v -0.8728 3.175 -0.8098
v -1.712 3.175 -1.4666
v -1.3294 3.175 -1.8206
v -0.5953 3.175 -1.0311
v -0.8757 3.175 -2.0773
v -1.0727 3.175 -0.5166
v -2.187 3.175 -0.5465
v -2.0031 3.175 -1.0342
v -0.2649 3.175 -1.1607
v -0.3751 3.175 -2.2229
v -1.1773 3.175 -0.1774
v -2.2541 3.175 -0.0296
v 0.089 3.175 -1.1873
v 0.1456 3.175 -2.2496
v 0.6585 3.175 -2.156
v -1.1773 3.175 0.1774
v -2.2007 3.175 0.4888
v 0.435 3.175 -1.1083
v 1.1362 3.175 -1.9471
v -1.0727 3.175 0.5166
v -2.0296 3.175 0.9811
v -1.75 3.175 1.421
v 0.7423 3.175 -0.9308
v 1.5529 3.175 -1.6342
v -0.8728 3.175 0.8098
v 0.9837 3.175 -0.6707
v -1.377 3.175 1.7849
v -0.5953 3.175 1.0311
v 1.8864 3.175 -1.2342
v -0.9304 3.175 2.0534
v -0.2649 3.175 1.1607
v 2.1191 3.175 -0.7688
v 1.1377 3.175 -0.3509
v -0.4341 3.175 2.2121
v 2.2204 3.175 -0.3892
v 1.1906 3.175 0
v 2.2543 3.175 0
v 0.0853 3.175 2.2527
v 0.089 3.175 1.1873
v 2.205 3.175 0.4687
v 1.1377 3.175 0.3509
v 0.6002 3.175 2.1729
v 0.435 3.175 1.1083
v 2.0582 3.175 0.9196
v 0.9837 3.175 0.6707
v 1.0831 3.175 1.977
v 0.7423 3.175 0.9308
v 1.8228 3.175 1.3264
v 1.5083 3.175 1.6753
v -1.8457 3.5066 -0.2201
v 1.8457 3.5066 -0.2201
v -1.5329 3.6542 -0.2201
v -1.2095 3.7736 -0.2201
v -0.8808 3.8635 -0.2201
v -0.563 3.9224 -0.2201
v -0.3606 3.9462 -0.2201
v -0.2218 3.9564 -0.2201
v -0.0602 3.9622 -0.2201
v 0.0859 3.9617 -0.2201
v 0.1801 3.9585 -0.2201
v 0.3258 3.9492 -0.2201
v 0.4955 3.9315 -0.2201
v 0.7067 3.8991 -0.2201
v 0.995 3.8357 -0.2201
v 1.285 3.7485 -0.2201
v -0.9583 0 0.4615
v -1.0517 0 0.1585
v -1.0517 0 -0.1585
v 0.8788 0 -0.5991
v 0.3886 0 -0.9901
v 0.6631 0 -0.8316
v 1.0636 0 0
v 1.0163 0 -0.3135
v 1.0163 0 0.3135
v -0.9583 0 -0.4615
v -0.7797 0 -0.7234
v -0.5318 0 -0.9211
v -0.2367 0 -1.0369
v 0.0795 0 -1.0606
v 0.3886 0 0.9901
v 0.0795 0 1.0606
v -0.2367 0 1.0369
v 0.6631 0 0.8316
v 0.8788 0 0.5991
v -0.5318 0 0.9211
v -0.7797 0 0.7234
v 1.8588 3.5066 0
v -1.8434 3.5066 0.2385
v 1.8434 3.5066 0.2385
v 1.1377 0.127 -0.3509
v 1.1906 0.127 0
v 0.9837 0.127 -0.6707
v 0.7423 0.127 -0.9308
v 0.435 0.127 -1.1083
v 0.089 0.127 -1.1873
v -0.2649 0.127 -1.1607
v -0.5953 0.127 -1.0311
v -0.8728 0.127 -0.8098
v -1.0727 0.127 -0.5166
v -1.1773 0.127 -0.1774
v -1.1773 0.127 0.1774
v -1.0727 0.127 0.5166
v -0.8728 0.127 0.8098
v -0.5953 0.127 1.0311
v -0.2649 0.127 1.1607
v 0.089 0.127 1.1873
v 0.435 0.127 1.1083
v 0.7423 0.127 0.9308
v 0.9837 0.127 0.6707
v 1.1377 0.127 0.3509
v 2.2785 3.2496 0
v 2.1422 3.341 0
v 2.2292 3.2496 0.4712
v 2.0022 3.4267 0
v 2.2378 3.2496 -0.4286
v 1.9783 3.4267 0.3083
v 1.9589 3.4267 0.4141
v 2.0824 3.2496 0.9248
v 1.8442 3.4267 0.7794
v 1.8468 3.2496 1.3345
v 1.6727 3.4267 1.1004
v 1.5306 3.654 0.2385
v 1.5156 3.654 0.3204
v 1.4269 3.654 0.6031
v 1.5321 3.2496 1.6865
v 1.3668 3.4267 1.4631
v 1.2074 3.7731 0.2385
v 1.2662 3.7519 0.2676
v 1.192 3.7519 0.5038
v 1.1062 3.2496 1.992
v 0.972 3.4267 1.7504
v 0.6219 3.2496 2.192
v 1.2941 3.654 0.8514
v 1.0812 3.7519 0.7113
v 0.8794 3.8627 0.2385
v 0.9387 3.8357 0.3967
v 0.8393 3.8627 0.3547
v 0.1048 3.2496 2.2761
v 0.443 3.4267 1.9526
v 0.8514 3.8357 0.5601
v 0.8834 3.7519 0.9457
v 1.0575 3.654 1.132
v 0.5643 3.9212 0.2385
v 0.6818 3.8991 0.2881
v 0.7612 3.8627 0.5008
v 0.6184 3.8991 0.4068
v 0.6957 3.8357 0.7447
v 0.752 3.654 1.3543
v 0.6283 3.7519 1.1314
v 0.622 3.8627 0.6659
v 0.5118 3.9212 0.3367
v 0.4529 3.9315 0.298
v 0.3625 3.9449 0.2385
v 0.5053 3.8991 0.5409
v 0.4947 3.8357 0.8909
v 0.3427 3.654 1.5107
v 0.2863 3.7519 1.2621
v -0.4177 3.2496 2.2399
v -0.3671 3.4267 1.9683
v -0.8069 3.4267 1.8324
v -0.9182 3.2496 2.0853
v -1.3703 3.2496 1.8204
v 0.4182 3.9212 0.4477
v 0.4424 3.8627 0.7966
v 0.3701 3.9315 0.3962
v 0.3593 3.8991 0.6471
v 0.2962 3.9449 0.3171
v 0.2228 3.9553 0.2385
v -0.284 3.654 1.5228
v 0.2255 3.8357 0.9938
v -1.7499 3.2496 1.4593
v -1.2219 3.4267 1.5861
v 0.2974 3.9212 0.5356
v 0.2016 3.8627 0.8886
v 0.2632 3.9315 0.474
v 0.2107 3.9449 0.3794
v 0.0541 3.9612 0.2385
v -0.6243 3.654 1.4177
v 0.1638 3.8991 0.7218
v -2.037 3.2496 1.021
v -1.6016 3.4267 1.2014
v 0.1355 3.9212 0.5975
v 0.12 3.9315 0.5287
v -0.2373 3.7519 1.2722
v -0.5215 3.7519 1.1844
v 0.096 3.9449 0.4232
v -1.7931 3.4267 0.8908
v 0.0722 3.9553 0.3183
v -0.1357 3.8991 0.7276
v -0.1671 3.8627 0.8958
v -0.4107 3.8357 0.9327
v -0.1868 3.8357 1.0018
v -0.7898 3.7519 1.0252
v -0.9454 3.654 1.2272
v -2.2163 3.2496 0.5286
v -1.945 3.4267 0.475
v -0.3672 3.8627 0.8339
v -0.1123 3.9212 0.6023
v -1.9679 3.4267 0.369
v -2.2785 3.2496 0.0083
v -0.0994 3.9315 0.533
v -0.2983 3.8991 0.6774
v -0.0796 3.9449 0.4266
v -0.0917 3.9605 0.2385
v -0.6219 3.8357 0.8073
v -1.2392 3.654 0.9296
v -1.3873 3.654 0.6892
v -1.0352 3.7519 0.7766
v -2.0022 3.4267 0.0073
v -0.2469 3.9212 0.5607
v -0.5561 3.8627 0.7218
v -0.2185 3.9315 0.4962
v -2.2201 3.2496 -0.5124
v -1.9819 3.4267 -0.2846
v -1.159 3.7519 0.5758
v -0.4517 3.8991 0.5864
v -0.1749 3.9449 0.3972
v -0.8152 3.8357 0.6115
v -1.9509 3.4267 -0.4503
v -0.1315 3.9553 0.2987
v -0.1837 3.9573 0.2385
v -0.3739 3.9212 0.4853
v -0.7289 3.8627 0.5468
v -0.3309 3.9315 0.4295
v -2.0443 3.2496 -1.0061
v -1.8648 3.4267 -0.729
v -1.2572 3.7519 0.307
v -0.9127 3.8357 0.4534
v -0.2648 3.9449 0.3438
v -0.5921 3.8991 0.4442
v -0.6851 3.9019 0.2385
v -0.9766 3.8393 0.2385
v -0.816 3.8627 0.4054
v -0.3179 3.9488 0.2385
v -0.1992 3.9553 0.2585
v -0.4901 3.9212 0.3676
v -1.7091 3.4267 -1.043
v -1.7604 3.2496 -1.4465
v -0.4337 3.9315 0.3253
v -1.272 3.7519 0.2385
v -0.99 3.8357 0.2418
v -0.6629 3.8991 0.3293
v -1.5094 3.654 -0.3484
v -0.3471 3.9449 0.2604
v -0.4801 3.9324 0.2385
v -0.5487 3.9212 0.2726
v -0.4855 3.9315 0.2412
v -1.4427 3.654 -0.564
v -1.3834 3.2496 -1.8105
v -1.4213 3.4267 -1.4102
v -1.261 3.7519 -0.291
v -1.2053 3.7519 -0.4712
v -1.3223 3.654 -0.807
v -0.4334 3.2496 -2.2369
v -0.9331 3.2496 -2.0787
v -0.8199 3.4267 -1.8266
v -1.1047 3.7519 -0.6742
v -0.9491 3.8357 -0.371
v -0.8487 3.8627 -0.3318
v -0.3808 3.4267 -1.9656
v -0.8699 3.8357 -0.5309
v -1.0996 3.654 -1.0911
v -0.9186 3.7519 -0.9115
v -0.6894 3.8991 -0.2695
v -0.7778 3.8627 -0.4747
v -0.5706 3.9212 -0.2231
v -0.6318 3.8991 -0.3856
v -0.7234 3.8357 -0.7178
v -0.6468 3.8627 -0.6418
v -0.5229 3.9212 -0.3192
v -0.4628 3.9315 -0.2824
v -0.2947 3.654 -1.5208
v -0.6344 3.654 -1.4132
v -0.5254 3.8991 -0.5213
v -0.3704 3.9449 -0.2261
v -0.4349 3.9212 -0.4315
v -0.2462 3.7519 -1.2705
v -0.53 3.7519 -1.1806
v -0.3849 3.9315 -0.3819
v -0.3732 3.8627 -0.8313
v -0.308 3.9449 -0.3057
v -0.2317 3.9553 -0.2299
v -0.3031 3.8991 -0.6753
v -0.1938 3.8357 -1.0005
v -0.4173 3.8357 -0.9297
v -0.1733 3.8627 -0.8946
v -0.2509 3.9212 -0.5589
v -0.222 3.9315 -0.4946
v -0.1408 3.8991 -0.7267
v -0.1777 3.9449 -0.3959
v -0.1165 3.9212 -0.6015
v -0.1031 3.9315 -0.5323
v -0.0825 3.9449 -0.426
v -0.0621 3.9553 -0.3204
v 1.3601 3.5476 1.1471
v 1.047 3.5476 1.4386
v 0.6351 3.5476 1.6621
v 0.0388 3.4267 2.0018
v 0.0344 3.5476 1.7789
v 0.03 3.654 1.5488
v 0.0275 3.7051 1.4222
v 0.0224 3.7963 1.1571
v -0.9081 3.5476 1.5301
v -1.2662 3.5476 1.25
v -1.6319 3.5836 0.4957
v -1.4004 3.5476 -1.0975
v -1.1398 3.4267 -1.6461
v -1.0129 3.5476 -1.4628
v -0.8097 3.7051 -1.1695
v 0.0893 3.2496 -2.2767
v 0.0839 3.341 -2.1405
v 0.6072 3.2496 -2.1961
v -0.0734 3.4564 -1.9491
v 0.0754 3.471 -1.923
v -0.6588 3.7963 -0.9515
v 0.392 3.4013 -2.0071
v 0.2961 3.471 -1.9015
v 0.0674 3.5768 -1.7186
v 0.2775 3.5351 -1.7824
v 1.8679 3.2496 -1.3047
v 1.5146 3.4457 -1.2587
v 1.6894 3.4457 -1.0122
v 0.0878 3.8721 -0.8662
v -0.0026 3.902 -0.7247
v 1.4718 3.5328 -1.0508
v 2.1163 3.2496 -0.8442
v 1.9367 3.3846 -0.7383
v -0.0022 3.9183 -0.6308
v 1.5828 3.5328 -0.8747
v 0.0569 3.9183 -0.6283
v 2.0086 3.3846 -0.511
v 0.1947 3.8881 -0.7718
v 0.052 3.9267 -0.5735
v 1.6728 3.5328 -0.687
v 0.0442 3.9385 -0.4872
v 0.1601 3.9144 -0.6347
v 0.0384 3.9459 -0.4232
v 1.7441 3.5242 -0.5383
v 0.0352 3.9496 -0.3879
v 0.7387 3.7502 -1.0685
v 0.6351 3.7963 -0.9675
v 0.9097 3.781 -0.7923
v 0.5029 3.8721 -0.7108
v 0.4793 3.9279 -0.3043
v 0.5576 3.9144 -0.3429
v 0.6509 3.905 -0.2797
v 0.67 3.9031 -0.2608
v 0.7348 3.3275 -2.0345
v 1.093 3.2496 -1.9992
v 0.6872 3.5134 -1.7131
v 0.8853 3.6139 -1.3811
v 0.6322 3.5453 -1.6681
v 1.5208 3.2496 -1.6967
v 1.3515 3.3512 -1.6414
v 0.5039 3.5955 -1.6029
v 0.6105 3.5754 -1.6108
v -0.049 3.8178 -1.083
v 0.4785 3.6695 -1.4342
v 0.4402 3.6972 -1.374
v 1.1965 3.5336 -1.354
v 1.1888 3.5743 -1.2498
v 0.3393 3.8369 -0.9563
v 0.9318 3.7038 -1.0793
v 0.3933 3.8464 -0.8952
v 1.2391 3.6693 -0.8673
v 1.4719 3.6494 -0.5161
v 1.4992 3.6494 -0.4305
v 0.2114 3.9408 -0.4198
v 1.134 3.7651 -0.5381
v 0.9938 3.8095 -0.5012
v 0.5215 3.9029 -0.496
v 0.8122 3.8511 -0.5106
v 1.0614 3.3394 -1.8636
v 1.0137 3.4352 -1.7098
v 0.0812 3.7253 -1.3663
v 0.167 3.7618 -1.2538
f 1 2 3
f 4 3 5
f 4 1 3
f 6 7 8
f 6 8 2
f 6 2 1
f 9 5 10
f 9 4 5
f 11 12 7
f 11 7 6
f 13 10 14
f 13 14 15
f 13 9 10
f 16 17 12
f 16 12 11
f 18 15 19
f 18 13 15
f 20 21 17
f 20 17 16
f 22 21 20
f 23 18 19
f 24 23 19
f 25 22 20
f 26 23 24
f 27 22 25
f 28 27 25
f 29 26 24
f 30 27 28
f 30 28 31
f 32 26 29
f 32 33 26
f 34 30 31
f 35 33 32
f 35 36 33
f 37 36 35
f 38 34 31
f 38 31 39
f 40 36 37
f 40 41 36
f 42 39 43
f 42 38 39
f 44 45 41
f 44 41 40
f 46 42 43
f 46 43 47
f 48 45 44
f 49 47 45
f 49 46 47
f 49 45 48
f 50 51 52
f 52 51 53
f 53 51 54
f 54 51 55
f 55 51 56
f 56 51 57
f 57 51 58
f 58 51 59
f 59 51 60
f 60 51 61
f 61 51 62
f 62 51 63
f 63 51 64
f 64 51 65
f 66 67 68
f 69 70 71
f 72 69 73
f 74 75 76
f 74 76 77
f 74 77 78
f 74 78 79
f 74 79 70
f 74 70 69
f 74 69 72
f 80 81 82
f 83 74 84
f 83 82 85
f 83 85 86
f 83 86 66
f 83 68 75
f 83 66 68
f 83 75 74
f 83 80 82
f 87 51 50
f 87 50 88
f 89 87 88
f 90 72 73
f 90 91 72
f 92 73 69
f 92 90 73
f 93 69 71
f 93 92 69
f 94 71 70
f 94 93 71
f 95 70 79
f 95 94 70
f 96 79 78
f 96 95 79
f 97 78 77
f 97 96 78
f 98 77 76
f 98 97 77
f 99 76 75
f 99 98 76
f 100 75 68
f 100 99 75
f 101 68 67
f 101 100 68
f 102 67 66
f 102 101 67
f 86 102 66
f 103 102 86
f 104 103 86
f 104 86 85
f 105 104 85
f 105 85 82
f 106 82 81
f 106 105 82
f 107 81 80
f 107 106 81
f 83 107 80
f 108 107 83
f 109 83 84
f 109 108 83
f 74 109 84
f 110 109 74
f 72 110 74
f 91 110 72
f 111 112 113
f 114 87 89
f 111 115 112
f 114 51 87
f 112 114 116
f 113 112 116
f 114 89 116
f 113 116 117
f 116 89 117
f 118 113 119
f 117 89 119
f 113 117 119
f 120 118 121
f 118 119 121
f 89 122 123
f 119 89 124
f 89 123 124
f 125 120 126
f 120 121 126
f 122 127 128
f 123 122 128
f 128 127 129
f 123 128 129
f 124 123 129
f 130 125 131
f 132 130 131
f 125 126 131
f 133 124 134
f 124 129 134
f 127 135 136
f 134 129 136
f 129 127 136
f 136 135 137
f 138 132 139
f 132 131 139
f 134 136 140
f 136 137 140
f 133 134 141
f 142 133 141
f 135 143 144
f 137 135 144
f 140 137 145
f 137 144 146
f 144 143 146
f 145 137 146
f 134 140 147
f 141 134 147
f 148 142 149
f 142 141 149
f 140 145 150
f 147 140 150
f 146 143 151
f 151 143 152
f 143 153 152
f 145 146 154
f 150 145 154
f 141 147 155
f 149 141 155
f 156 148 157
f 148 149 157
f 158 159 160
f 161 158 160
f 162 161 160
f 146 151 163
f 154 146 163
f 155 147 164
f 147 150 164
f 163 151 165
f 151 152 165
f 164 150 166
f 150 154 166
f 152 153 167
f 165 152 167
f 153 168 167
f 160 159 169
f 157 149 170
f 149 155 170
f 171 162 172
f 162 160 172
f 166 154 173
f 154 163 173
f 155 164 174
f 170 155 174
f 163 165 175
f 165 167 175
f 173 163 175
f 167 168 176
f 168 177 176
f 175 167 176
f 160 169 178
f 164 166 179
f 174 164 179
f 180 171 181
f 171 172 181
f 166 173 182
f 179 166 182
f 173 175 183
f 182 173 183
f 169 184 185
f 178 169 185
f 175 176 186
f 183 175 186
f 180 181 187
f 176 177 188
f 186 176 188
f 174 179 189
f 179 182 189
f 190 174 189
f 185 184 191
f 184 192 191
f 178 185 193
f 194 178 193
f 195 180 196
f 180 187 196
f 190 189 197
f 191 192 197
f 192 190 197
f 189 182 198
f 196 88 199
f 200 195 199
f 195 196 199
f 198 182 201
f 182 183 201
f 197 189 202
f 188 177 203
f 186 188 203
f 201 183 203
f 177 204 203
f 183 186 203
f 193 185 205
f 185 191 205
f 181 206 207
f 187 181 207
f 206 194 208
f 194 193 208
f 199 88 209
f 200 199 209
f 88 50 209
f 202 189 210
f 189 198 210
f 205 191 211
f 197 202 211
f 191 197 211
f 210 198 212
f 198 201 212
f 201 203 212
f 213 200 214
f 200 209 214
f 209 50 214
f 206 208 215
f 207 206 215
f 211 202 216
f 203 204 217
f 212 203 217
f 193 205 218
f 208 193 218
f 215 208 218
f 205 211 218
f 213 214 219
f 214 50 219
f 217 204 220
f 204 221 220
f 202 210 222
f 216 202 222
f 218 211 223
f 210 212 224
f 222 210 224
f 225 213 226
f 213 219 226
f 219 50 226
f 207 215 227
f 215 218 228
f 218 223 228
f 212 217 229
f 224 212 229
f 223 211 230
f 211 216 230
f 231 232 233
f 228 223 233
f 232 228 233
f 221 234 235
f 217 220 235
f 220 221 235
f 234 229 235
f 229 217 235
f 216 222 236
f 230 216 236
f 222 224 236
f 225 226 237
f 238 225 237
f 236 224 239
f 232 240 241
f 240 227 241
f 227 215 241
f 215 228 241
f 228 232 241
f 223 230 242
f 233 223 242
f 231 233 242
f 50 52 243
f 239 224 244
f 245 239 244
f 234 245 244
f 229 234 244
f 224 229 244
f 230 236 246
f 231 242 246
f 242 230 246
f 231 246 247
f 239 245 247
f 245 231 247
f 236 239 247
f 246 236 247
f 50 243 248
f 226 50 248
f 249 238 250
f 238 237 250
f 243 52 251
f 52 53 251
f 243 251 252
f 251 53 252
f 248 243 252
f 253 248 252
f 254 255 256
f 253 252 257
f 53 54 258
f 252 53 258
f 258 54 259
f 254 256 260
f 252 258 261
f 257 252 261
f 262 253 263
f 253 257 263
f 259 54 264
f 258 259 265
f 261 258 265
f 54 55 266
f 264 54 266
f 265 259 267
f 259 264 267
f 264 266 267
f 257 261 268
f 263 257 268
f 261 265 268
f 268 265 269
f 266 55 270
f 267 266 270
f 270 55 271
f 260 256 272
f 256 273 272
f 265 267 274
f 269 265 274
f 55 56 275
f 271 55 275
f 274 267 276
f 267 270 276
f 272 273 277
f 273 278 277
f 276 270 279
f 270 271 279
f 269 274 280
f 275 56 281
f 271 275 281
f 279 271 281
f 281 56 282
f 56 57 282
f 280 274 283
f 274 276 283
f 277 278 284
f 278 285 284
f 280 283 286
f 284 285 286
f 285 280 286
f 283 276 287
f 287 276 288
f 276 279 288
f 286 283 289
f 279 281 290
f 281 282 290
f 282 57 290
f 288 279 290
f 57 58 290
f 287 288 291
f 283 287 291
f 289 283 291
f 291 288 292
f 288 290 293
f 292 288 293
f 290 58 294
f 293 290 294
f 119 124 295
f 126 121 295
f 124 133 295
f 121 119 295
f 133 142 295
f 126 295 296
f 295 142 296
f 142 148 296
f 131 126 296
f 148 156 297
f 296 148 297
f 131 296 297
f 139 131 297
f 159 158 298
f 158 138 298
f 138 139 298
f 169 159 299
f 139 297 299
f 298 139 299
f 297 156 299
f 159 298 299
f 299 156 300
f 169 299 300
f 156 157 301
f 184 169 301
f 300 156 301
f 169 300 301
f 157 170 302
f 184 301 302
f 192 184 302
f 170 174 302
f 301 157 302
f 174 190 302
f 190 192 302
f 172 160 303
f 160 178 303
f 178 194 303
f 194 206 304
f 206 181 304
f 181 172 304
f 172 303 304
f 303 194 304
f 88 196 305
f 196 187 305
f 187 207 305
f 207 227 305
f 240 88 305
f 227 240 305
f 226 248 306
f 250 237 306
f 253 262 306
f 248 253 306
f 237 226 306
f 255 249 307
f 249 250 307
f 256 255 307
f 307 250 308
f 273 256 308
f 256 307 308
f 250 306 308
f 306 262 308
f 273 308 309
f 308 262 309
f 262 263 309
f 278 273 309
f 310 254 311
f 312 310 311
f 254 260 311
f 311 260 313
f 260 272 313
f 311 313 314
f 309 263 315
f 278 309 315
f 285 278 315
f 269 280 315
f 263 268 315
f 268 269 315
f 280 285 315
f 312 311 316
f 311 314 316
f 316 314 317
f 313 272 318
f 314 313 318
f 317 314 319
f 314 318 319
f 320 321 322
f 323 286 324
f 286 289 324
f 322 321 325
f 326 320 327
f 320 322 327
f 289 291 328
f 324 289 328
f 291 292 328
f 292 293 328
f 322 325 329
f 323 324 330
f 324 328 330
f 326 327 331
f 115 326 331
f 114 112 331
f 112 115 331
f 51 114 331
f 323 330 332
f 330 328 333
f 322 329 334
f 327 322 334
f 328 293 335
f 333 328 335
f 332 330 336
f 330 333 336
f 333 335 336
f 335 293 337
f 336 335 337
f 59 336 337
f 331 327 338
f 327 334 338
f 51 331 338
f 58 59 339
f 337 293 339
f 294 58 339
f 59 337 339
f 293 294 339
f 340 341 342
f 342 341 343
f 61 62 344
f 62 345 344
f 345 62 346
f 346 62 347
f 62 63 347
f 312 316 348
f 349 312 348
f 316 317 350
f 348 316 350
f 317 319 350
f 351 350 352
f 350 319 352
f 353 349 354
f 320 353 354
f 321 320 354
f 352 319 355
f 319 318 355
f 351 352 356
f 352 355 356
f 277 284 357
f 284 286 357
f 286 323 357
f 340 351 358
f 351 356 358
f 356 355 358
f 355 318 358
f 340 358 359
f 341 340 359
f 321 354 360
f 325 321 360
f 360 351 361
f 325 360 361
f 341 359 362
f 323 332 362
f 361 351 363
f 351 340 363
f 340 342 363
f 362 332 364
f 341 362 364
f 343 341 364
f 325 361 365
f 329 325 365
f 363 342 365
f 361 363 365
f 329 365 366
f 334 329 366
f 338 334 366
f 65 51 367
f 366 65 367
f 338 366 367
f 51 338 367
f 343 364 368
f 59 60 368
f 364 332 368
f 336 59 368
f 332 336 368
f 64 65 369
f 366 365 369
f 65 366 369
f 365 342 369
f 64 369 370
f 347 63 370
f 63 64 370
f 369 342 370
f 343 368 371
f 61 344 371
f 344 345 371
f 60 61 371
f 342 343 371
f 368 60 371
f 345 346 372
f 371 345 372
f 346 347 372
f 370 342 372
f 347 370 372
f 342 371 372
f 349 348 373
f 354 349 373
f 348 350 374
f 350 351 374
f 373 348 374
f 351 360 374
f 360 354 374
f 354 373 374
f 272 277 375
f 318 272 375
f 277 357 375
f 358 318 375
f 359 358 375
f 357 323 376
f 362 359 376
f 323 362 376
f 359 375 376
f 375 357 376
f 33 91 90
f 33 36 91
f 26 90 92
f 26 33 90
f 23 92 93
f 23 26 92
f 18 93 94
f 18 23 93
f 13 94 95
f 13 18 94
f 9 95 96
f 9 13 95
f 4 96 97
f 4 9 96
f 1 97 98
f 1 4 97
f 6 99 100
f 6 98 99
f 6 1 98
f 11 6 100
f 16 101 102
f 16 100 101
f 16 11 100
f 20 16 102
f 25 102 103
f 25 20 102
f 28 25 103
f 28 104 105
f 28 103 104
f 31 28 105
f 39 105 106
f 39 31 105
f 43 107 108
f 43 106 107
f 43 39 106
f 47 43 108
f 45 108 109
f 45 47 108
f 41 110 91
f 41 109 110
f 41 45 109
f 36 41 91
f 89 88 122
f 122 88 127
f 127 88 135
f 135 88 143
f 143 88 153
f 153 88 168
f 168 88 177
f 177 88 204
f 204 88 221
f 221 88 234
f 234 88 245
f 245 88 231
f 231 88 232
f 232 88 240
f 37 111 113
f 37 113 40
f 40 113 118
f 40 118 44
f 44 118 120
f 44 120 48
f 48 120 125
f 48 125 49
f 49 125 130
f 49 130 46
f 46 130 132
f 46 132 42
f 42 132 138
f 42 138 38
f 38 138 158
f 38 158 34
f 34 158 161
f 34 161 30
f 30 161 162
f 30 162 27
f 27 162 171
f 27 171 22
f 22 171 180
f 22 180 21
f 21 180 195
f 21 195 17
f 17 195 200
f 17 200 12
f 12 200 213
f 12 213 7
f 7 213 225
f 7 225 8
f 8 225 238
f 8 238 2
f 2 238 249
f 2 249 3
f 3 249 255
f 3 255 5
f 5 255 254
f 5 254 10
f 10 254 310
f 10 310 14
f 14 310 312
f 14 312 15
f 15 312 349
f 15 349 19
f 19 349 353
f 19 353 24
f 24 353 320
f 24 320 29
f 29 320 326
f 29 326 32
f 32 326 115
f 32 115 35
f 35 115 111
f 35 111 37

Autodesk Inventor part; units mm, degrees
ref_plane "YZ Plane" through (0, 0, 0) normal (1, 0, 0) x (0, 1, 0)
ref_plane "XZ Plane" through (0, 0, 0) normal (0, 1, 0) x (-1, 0, 0)
ref_plane "XY Plane" through (0, 0, 0) normal (0, 0, 1) x (1, 0, 0)
sketch "Sketch1" plane through (0, 0, 0) normal (0, 0, 1) x (1, 0, 0)
  line L0 (0, 3.9687) -> (0, 0)
  line L1 (0, 0) -> (1.1906, 0)
  line L2 (1.1906, 0) -> (1.1906, 3.175)
  line L3 (1.1906, 3.175) -> (2.3813, 3.175)
  arc A0 (2.3813, 3.175) -> (0, 3.9687) centre (0, 0) ccw
  line L4 (0, 3.9687) -> (11.1125, 3.9688)
  dimension "d1" = 1.1906
  dimension "d2" = 2.3813
  dimension "d3" = 0.7937
revolve "Revolution1" add sketch "Sketch1" angle 360 about axis through (0, 3.9687, 0) along (0, -1, 0)
chamfer "Chamfer1" distance 0.127 angle 45 2 edges at (-1.1906, 0, 0) (-2.3813, 3.175, 0)
sketch "Sketch2" plane through (0, 0, 0) normal (1, 0, 0) x (0, 1, 0)
  line L0 (3.5066, 0.2385) -> (4.5681, 0.2385)
  line L1 (4.5681, 0.2385) -> (4.5681, -0.2201)
  line L2 (4.5681, -0.2201) -> (3.5066, -0.2201)
  line L3 (3.5066, -0.2201) -> (3.5066, 0.2385)
extrude "Extrusion1" cut sketch "Sketch2" against normal mid plane 25.4
equation "\"d1\" = 0.5 * d2"
properties part number "screw" material "Stainless Steel"
